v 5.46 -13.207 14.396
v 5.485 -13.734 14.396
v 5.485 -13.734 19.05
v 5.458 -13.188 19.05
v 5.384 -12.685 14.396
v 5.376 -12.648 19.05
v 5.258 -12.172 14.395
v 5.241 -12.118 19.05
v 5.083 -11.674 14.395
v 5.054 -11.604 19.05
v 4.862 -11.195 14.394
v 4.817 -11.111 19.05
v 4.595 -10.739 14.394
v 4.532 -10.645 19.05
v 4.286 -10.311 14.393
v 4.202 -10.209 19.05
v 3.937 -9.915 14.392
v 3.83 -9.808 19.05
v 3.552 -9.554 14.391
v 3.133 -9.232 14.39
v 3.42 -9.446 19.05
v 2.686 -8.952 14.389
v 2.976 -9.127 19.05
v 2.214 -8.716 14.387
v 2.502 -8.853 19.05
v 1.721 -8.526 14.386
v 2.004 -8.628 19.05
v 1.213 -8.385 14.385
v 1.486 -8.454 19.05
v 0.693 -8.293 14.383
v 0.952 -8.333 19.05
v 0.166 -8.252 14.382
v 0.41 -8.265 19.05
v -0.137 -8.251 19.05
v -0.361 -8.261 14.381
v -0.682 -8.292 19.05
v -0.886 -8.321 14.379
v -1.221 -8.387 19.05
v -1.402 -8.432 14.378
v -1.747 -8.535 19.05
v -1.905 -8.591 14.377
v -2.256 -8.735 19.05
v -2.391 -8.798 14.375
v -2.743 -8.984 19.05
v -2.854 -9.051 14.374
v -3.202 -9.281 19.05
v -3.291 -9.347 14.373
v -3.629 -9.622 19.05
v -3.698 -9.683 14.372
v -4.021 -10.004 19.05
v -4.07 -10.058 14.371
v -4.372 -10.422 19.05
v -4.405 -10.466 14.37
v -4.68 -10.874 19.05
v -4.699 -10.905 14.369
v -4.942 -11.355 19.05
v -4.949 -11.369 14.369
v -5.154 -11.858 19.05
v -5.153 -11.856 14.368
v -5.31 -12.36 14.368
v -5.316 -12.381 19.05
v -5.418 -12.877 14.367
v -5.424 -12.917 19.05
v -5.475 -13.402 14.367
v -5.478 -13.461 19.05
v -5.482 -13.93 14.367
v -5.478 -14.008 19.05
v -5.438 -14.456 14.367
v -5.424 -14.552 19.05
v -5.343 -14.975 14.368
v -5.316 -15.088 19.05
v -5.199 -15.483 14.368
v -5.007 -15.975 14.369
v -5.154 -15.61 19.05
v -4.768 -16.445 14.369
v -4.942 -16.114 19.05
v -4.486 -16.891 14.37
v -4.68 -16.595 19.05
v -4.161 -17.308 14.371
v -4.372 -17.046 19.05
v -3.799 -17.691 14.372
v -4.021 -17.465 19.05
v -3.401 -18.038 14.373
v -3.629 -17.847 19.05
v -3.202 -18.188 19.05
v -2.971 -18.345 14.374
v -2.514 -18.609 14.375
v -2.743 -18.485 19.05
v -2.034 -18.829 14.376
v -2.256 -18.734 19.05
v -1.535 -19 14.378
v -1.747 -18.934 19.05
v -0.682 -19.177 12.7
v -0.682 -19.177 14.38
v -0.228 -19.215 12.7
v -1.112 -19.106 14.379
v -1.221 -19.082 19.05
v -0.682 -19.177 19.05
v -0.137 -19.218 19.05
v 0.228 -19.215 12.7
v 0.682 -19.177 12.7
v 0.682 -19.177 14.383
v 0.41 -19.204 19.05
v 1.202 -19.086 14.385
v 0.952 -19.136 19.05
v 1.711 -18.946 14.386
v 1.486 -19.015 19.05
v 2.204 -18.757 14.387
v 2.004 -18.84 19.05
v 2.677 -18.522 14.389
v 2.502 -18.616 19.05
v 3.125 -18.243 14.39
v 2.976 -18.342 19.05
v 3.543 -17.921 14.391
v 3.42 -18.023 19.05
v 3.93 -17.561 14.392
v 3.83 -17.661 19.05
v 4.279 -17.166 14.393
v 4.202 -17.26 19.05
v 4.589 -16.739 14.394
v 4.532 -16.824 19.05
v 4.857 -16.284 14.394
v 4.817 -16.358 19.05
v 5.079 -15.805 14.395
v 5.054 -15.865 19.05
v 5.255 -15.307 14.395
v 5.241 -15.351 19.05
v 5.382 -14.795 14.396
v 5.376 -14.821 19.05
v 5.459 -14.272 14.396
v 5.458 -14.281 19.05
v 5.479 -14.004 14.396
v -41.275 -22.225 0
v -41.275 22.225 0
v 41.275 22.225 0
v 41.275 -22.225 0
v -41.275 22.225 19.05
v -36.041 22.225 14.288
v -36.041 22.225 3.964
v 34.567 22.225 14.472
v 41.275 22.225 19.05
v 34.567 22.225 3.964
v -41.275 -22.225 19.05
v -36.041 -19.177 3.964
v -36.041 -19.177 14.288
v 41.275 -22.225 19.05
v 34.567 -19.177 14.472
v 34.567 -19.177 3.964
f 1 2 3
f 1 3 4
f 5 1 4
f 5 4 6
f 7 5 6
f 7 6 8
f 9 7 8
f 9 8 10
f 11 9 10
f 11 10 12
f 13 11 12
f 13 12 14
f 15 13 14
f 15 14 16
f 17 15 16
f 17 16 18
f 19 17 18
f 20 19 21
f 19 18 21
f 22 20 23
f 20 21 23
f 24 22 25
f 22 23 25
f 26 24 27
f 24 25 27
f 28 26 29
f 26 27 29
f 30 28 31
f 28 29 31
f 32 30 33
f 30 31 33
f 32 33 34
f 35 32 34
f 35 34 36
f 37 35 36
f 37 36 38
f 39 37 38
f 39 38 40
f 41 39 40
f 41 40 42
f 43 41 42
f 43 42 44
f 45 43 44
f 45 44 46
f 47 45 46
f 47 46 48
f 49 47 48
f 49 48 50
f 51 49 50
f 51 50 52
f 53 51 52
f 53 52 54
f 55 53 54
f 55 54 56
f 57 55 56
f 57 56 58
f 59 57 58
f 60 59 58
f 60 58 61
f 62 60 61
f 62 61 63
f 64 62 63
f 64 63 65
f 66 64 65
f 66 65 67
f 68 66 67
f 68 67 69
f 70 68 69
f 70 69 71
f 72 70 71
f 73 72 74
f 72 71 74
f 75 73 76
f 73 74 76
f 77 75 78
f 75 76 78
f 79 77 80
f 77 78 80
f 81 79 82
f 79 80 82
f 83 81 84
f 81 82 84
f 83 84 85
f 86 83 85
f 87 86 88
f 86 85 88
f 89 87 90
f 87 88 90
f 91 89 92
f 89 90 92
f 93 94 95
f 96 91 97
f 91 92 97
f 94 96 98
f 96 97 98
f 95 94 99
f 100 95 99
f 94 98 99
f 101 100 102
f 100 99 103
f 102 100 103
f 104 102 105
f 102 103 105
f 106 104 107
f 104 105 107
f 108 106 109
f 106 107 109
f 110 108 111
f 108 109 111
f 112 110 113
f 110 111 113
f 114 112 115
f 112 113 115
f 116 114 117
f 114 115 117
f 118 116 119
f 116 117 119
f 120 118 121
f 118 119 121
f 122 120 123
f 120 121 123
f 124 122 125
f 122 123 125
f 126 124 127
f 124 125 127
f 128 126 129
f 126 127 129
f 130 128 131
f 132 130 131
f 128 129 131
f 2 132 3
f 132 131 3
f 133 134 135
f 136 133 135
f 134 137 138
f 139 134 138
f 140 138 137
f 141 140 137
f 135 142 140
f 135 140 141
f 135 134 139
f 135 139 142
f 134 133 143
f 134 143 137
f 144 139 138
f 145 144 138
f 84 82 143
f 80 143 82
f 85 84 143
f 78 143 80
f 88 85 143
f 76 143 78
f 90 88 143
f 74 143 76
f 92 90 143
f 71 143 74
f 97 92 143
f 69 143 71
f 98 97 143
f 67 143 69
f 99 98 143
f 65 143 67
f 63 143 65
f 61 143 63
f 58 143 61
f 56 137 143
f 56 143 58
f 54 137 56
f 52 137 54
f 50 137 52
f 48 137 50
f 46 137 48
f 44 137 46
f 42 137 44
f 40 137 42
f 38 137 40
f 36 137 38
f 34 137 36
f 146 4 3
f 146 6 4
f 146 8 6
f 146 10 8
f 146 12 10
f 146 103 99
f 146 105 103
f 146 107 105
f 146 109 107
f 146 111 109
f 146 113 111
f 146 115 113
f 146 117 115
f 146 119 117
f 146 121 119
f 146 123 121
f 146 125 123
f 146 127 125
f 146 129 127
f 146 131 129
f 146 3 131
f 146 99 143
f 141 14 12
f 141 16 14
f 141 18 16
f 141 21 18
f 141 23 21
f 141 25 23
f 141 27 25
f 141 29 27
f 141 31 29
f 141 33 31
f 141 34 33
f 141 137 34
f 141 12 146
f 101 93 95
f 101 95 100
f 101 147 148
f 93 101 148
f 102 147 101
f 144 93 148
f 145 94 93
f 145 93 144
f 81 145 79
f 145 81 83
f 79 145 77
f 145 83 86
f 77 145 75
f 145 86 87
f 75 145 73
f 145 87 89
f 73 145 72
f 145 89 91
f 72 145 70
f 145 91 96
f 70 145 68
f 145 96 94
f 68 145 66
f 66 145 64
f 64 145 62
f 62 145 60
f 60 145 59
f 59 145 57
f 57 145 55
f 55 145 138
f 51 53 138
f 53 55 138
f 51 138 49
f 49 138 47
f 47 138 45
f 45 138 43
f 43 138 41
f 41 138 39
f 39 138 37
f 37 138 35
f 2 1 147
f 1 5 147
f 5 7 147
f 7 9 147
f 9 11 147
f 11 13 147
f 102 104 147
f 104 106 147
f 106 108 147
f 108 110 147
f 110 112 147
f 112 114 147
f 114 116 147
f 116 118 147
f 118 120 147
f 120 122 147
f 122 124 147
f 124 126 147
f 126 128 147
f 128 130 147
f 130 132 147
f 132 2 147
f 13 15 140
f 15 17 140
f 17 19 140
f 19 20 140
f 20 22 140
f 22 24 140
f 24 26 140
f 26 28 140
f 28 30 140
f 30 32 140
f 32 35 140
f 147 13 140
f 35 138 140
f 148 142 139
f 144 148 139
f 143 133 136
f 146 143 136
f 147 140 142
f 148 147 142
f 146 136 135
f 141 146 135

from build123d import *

# Parameters (mm, degrees)
F0_W     = 82.55
F0_H     = 44.45
F1_DEPTH = 19.05
F3_DEPTH = 41.402
F4_R     = 5.485136
F5_DEPTH = 6.35


with BuildPart() as f1:
    # F0 (on Top) → F1 (new body)
    with BuildSketch(Plane.XY):
        Rectangle(F0_W, F0_H)
    extrude(amount=F1_DEPTH)

    # F2 (on face) → F3 (cut)
    with BuildSketch(Plane(origin=(0, 22.225, 0), x_dir=(-1, 0, 0), z_dir=(0, 1, 0))):
        Polygon((36.041375, 14.287501), (-34.566533, 14.471854), (-34.566533, 3.963629), (36.041375, 3.963629), align=None)
    extrude(amount=-F3_DEPTH, mode=Mode.SUBTRACT)

    # F4 (on face) → F5 (cut)
    with BuildSketch(Plane.XY.offset(19.05)):
        with Locations((0, -13.734437)):
            Circle(F4_R)
    extrude(amount=-F5_DEPTH, mode=Mode.SUBTRACT)


solid = f1.part
